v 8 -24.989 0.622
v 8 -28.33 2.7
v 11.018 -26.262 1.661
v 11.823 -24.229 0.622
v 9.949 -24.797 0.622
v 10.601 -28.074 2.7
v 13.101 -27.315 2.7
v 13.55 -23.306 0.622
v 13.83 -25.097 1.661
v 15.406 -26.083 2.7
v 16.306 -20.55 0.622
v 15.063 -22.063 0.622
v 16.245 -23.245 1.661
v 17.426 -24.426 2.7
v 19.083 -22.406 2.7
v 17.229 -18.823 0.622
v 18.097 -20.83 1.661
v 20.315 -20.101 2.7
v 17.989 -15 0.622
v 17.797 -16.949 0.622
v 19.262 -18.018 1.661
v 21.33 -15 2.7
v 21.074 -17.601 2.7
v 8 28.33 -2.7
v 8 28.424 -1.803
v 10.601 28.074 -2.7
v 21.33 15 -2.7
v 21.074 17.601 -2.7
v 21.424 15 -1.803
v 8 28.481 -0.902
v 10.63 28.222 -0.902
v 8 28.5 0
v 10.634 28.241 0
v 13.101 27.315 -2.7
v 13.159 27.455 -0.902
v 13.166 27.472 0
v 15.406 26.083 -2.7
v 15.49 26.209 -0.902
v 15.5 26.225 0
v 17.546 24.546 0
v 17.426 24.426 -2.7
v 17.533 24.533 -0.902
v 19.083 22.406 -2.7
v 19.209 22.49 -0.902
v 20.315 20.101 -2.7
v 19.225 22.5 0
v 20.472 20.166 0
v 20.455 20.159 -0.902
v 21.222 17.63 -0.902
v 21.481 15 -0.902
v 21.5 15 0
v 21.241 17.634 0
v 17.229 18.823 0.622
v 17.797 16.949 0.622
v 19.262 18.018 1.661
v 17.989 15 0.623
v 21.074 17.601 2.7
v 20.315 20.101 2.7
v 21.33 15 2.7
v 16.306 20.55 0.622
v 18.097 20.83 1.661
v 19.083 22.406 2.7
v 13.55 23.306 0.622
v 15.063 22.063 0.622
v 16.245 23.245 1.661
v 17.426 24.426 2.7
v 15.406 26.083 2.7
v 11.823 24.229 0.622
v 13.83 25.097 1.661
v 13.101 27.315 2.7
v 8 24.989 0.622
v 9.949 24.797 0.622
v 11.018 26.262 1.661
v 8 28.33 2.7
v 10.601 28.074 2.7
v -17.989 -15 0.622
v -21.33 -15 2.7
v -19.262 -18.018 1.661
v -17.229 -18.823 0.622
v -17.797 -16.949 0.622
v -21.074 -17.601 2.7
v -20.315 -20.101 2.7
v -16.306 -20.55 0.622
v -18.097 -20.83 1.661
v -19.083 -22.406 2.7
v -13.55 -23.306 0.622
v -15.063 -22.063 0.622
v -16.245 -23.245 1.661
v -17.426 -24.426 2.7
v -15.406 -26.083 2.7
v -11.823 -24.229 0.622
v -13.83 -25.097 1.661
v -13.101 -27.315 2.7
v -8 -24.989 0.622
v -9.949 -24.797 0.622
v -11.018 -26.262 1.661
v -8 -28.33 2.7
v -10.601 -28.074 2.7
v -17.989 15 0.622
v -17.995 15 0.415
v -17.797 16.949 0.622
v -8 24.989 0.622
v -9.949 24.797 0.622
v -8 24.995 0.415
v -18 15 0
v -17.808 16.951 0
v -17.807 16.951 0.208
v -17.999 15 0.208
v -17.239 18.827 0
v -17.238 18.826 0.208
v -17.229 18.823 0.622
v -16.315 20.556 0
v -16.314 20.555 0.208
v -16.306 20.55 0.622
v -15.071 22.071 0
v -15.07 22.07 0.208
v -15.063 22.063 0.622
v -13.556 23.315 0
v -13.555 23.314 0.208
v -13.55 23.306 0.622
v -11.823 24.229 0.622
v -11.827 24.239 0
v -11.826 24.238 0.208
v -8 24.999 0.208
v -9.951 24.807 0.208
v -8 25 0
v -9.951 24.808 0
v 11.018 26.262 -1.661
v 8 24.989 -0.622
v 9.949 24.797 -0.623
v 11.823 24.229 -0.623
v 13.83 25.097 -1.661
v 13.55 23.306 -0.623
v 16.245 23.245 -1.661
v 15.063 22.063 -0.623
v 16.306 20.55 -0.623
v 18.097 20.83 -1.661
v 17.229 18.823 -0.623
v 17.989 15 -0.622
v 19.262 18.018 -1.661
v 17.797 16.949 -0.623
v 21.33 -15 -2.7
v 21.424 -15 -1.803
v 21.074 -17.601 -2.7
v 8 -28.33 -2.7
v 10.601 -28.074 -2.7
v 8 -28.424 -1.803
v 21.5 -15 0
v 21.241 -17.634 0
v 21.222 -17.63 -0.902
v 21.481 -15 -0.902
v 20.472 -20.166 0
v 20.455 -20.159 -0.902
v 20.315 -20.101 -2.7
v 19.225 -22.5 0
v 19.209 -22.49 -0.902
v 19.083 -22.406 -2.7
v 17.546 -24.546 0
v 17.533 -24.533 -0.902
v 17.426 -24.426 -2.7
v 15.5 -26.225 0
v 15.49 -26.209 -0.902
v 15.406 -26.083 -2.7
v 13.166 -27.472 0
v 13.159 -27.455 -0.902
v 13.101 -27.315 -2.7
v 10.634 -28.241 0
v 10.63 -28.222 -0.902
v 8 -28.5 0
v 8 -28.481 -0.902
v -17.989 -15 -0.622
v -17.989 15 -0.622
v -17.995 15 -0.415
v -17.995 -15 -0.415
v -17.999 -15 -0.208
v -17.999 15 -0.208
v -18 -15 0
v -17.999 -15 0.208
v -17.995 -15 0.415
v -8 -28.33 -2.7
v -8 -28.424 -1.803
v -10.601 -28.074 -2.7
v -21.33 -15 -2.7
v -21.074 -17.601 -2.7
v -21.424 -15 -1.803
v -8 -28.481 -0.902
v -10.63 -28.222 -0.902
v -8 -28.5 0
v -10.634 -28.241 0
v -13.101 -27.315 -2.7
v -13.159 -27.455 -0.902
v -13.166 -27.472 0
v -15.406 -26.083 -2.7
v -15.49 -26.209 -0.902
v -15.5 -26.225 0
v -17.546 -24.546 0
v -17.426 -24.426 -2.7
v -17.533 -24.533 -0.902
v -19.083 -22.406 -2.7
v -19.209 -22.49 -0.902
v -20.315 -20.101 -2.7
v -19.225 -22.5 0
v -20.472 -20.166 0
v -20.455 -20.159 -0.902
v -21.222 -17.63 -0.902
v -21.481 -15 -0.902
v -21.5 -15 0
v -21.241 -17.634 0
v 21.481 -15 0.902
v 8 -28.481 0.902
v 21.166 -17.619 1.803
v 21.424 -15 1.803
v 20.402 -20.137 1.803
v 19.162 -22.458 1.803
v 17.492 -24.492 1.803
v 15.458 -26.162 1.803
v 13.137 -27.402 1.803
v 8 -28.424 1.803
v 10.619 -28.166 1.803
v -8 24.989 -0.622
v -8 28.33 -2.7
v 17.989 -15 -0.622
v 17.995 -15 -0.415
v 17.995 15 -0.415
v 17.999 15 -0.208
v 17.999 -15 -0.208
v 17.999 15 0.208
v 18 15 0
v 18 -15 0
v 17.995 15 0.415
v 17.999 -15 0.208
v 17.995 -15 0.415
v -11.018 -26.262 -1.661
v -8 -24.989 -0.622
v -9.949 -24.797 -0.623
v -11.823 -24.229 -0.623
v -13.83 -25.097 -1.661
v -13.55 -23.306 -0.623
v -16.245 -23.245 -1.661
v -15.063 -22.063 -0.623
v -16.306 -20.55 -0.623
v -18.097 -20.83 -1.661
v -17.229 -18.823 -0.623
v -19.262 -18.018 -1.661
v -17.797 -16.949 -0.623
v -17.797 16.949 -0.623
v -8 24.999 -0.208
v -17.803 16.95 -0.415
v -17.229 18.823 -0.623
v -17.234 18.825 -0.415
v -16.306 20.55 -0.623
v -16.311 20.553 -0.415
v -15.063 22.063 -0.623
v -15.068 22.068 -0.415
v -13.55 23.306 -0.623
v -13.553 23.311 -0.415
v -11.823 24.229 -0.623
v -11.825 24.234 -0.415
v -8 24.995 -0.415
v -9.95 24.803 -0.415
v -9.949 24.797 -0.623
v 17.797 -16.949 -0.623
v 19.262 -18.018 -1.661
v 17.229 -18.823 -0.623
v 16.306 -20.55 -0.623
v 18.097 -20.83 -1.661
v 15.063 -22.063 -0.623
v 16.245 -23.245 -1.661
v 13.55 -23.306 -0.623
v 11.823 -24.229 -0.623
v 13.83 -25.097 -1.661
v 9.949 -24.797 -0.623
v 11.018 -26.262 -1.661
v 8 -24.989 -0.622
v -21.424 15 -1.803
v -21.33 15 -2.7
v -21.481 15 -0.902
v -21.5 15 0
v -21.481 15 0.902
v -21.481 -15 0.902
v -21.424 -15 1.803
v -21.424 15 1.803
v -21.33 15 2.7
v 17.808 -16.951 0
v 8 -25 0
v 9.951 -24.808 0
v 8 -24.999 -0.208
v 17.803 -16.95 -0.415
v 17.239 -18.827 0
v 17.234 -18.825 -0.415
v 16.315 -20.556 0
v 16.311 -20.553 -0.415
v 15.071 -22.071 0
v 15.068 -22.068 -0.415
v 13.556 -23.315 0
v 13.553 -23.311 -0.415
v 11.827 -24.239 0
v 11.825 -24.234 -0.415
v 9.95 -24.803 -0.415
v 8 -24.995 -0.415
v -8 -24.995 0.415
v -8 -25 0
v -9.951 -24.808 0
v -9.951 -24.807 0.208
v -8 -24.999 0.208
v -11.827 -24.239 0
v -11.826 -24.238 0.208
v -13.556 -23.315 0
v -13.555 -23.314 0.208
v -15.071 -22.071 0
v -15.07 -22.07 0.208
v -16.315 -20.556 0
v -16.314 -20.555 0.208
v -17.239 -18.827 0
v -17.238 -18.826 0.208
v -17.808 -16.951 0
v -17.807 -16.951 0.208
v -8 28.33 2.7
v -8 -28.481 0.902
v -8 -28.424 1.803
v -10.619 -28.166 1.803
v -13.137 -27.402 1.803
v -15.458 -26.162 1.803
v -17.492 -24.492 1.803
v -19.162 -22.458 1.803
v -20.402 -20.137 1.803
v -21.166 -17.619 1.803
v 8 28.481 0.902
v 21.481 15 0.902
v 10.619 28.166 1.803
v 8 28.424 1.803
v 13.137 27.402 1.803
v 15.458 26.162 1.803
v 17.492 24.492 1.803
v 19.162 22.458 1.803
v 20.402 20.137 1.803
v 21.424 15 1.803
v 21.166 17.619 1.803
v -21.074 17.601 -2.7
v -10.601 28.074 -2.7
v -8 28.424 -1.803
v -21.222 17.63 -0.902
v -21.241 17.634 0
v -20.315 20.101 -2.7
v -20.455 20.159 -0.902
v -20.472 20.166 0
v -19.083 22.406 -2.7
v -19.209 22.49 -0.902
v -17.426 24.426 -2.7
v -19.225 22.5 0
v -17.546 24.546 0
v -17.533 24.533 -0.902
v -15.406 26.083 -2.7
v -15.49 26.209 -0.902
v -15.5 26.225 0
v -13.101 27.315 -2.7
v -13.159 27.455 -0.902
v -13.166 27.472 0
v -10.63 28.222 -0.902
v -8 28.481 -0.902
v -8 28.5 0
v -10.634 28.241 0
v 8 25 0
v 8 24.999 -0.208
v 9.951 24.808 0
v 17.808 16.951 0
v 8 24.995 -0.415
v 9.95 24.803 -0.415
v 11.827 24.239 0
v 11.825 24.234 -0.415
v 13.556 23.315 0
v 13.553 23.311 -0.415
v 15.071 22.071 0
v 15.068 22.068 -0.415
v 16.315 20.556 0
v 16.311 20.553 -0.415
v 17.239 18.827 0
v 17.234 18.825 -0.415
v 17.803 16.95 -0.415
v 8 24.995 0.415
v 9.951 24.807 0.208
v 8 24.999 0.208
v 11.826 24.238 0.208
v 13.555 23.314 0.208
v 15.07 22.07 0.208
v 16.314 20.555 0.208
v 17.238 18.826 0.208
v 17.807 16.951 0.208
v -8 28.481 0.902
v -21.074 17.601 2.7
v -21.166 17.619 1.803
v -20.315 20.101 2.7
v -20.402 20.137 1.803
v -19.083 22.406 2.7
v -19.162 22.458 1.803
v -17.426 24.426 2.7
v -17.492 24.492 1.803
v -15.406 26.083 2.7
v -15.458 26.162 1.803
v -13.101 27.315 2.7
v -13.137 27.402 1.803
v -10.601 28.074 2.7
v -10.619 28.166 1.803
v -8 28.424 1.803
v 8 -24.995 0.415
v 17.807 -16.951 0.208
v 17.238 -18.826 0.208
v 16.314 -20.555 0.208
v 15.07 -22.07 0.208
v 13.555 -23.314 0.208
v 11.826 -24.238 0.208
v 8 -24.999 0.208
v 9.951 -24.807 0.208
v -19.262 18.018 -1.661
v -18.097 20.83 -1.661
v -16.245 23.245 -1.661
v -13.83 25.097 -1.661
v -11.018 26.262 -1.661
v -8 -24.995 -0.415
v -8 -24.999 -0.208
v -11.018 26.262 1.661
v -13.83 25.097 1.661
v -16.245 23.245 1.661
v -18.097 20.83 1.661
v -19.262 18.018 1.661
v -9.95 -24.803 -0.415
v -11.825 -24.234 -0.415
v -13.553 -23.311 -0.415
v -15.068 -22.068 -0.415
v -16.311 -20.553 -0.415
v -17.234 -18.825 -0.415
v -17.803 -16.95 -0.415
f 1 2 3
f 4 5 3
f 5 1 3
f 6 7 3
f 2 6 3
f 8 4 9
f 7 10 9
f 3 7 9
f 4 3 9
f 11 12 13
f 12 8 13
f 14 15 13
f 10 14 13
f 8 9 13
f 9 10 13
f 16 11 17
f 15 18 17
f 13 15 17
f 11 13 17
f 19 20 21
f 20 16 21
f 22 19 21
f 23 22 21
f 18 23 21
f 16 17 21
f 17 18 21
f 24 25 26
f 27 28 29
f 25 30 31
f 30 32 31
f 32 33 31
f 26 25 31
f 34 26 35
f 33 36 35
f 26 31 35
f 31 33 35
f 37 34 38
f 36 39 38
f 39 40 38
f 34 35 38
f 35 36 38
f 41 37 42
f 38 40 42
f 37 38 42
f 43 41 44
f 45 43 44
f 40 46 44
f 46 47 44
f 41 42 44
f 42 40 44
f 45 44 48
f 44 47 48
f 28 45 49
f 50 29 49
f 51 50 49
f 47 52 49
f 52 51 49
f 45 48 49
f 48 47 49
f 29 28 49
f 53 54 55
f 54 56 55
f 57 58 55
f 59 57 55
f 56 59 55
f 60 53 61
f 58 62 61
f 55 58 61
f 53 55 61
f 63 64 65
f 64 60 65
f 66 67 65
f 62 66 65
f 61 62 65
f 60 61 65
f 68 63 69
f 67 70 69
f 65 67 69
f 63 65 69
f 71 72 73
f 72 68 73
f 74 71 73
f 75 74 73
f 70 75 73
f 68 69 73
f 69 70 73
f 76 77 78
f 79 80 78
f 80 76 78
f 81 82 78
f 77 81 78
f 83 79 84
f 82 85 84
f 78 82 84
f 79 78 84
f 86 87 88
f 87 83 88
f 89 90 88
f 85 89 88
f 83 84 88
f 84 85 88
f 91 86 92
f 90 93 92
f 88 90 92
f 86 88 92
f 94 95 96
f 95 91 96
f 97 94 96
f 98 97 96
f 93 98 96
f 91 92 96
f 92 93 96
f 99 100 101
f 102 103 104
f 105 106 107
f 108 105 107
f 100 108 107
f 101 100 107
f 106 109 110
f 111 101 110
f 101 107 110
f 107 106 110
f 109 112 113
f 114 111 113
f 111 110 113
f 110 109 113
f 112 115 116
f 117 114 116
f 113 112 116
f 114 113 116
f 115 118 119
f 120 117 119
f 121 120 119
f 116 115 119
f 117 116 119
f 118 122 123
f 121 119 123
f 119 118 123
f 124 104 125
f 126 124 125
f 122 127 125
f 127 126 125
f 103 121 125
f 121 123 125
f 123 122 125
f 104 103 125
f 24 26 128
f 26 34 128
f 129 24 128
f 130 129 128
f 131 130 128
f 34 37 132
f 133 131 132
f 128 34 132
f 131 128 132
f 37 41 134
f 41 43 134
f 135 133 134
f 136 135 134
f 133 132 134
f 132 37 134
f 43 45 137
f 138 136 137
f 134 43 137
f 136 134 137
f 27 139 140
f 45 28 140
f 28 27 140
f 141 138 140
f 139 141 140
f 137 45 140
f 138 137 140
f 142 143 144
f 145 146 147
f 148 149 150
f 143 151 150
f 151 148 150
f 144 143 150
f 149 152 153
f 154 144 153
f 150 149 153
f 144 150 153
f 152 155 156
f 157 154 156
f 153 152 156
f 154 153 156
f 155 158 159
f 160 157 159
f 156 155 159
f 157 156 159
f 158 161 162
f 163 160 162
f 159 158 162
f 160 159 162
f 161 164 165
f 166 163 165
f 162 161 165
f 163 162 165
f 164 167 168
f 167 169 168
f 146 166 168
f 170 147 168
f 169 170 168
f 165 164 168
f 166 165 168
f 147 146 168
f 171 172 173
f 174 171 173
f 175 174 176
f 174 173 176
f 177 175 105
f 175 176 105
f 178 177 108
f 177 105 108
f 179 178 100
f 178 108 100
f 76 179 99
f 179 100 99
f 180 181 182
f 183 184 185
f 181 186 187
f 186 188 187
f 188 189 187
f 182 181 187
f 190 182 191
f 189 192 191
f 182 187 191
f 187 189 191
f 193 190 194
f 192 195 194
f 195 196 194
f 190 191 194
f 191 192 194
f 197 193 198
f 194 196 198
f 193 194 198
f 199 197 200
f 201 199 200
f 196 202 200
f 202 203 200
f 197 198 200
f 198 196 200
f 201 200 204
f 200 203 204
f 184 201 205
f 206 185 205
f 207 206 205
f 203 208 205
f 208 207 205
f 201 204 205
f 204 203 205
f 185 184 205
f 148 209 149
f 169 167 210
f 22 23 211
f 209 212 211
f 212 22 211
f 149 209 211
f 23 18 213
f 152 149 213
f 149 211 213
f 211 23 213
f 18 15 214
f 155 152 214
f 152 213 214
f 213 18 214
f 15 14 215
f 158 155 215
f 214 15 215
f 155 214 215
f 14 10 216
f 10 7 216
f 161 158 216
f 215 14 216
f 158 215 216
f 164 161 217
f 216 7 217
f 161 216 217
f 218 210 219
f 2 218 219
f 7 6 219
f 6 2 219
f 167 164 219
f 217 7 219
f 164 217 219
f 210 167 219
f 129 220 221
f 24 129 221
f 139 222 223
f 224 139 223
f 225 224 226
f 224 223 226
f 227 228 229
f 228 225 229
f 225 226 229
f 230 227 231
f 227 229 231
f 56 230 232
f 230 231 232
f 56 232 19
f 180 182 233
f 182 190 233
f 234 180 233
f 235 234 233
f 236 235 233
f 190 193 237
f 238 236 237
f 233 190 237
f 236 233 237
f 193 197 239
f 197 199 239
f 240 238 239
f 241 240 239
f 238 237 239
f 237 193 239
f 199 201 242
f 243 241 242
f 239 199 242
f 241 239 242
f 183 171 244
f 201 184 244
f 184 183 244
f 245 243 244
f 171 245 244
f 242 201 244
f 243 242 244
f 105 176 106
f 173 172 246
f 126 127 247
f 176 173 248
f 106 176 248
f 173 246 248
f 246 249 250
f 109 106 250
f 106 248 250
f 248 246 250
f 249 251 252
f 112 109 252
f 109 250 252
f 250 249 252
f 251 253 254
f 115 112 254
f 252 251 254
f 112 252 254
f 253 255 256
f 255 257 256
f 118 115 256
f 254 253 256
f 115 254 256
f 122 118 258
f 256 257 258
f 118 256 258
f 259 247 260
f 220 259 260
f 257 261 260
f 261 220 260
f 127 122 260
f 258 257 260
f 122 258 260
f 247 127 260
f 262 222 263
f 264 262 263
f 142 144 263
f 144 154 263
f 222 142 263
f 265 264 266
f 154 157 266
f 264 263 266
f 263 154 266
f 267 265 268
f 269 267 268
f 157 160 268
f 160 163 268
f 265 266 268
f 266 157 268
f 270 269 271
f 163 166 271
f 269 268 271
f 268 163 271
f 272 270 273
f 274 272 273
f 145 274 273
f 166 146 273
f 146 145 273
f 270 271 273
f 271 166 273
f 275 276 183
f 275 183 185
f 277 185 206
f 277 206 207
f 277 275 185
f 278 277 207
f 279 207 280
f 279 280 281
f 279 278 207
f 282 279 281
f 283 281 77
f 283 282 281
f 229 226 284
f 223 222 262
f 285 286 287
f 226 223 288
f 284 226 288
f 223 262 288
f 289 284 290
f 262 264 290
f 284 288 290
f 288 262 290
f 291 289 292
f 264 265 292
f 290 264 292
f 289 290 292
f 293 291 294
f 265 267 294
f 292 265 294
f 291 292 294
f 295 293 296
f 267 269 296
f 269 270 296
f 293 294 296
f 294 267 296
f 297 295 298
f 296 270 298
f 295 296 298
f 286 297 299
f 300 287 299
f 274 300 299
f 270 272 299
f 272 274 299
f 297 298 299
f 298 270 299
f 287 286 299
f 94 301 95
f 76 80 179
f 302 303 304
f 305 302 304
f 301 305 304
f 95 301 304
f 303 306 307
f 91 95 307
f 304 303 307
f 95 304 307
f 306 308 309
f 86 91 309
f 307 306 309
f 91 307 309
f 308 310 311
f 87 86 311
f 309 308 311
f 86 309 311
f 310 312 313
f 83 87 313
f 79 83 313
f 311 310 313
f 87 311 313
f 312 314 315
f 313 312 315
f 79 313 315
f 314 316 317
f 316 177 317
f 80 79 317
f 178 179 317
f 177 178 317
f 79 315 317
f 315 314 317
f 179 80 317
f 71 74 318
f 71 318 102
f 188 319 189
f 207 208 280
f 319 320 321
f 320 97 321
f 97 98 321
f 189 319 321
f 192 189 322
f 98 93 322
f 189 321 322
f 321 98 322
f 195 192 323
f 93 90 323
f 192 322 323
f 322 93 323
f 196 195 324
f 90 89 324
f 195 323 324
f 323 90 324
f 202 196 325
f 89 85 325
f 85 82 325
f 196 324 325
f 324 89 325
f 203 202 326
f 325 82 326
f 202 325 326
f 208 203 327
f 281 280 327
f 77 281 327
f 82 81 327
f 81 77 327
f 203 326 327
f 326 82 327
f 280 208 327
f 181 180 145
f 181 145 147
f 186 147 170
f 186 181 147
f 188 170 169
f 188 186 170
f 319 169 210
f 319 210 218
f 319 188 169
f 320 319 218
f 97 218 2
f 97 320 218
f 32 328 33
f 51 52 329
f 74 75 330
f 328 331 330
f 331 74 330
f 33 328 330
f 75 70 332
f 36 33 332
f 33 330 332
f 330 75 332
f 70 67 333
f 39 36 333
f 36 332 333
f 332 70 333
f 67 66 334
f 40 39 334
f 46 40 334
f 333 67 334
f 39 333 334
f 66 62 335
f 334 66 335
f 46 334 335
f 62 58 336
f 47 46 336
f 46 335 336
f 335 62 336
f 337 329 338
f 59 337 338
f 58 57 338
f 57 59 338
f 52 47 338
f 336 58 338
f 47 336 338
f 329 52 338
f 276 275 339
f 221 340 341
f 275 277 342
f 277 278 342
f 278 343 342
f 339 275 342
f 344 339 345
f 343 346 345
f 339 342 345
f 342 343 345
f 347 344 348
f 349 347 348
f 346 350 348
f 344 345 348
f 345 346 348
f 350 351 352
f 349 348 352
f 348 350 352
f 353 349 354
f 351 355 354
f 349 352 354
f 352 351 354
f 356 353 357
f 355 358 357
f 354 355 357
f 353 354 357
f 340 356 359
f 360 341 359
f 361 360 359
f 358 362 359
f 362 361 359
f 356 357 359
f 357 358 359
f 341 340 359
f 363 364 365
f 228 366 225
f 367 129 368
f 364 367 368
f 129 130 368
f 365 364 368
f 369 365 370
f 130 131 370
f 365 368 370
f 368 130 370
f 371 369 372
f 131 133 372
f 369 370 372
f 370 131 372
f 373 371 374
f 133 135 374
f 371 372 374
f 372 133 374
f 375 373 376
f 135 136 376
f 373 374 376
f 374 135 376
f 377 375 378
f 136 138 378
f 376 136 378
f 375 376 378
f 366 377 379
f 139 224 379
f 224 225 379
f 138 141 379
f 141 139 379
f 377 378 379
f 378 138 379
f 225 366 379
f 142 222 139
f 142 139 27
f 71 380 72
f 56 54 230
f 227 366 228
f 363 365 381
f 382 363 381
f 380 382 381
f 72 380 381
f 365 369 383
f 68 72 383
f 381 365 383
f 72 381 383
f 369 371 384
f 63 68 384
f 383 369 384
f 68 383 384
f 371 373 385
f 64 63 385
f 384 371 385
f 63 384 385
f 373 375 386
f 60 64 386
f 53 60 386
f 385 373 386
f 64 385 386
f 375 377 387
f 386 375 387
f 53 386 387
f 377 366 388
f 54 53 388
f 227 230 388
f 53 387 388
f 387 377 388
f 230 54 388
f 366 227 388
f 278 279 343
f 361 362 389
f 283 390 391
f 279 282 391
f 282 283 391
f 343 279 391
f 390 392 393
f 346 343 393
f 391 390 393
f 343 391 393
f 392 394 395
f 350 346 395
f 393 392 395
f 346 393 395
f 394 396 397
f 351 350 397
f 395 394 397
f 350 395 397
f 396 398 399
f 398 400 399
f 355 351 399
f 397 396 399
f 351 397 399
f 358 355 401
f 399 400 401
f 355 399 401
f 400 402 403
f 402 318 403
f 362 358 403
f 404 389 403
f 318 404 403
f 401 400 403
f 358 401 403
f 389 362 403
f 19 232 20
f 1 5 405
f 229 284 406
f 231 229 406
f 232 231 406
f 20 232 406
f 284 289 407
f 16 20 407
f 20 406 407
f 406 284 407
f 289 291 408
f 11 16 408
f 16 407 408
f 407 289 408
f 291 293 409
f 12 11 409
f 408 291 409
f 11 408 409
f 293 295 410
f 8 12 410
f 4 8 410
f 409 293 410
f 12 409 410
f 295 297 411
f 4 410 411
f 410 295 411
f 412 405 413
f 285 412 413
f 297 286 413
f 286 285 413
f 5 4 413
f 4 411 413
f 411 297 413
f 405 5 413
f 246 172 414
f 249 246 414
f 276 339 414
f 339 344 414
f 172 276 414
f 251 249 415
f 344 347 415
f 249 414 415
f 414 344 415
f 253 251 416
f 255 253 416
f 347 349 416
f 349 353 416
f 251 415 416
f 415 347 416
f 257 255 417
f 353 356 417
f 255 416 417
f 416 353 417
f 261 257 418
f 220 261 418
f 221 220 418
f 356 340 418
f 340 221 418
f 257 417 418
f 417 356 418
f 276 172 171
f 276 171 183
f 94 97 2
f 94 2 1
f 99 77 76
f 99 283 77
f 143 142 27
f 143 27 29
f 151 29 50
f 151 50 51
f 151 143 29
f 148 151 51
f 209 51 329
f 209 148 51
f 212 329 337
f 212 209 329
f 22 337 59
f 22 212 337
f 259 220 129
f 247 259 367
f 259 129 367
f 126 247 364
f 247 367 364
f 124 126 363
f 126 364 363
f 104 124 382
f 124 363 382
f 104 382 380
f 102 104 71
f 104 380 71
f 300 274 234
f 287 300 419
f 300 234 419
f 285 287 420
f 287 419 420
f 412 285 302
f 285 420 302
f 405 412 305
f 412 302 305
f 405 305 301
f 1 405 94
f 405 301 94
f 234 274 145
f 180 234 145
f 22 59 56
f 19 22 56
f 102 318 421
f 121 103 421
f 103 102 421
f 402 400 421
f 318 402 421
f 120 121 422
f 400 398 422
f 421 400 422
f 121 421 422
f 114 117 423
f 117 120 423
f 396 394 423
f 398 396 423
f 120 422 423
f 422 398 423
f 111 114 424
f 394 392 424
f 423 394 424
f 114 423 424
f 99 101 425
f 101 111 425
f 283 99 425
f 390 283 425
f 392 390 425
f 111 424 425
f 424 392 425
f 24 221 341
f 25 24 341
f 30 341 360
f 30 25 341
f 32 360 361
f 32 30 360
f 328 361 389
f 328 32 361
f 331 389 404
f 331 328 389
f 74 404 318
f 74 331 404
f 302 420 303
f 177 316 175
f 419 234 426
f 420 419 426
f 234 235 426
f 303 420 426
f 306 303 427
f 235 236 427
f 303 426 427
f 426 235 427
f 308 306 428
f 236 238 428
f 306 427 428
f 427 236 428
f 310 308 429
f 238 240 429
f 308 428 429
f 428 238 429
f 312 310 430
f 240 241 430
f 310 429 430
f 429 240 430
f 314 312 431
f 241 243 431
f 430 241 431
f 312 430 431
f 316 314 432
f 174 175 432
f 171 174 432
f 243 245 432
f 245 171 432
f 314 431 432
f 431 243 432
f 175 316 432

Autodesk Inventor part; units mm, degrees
ref_plane "YZ Plane" through (0, 0, 0) normal (1, 0, 0) x (0, 1, 0)
ref_plane "XZ Plane" through (0, 0, 0) normal (0, 1, 0) x (-1, 0, 0)
ref_plane "XY Plane" through (0, 0, 0) normal (0, 0, 1) x (1, 0, 0)
sketch "Szkic1" plane through (0, 0, 0) normal (0, 1, 0) x (-1, 0, 0)
  line L0 (30.1, 0) -> (-30.1, 0) projected
  circle A0 centre (0, 0) radius 18
  circle A1 centre (0, 0) radius 21.5
  line L1 (17.9892, -0.6225) -> (21.3298, -2.7)
  line L2 (17.9892, 0.6225) -> (21.3298, 2.7)
  point P0 (21.3298, 2.7)
  point P1 (17.9892, 0.6225)
  dimension "d4" = 43
  dimension "d5" = 36
  dimension "d6" = 5.4
  dimension "d7" = 1.245
sketch3d "Szkic 3D2"
  line L0 (18, 15, 0) -> (18, -15, 0)
  arc A0 (18, -15, 0) -> (8, -25, 0) centre (8, -15, 0) ccw
  line L1 (8, -25, 0) -> (-8, -25, 0)
  arc A1 (-8, -25, 0) -> (-18, -15, 0) centre (-8, -15, 0) ccw
  line L2 (-18, -15, 0) -> (-18, 15, 0)
  arc A2 (-18, 15, 0) -> (-8, 25, 0) centre (-8, 15, 0) ccw
  line L3 (-8, 25, 0) -> (8, 25, 0)
  arc A3 (8, 25, 0) -> (18, 15, 0) centre (8, 15, 0) ccw
  dimension "d9" = 50
  dimension "d10" = 36
  dimension "d11" = 10
  dimension "d12" = 10
  dimension "d13" = 10
  dimension "d14" = 10
sweep "Przeciągnięcie2" add profiles "Szkic1" path "Szkic 3D2" picked at (20.2478, -1.7084) picked at (20.2478, 1.7084) contours A1 L1 A0 L0 | L0 A0 L2 A1
equation "\"d12\" = d11"
equation "\"d13\" = d11"
equation "\"d14\" = d11"
properties part number "single_coil"
